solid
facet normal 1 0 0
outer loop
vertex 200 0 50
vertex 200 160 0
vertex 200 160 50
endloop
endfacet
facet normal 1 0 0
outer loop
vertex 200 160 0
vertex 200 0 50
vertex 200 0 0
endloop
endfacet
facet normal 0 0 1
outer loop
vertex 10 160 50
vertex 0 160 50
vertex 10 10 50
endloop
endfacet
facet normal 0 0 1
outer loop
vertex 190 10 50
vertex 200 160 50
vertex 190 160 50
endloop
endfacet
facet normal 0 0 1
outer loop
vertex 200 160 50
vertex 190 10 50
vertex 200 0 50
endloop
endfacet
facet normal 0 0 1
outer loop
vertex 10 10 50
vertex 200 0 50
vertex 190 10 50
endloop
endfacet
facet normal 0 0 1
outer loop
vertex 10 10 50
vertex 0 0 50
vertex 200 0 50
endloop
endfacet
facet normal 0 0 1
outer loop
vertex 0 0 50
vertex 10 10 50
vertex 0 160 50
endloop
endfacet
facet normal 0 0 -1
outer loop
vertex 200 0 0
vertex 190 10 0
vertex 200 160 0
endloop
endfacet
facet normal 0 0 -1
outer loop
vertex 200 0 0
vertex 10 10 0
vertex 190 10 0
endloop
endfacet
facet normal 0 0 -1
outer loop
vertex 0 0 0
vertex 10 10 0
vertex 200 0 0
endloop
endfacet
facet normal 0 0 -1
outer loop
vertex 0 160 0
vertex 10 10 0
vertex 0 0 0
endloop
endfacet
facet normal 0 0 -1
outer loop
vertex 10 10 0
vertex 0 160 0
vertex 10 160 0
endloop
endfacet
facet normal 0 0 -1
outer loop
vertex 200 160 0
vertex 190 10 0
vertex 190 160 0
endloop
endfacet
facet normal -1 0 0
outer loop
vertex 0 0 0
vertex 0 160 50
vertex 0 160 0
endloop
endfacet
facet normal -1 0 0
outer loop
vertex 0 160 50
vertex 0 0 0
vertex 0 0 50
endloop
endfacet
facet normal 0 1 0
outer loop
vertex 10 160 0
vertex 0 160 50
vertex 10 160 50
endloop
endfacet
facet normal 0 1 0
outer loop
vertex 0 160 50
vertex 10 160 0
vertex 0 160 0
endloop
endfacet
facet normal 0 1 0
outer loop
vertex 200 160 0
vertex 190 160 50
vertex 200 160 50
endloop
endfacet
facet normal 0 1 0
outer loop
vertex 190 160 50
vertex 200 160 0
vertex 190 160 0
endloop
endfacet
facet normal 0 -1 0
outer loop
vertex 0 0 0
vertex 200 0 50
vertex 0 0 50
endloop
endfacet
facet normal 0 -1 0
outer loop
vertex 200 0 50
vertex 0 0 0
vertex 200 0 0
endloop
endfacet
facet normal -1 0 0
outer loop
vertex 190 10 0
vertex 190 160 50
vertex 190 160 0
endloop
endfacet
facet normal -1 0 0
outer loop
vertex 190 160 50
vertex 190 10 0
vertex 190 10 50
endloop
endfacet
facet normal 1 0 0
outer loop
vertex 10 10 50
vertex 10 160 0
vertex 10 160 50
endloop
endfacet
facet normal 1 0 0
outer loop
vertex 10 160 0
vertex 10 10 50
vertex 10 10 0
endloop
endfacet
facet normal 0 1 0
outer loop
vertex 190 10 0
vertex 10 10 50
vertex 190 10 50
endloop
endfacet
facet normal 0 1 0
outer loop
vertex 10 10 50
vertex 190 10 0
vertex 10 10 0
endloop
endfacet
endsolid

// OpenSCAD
difference()
{
  cube([200,160,50]);
  translate([10,10,-10]) cube([180,160,120]);
}
